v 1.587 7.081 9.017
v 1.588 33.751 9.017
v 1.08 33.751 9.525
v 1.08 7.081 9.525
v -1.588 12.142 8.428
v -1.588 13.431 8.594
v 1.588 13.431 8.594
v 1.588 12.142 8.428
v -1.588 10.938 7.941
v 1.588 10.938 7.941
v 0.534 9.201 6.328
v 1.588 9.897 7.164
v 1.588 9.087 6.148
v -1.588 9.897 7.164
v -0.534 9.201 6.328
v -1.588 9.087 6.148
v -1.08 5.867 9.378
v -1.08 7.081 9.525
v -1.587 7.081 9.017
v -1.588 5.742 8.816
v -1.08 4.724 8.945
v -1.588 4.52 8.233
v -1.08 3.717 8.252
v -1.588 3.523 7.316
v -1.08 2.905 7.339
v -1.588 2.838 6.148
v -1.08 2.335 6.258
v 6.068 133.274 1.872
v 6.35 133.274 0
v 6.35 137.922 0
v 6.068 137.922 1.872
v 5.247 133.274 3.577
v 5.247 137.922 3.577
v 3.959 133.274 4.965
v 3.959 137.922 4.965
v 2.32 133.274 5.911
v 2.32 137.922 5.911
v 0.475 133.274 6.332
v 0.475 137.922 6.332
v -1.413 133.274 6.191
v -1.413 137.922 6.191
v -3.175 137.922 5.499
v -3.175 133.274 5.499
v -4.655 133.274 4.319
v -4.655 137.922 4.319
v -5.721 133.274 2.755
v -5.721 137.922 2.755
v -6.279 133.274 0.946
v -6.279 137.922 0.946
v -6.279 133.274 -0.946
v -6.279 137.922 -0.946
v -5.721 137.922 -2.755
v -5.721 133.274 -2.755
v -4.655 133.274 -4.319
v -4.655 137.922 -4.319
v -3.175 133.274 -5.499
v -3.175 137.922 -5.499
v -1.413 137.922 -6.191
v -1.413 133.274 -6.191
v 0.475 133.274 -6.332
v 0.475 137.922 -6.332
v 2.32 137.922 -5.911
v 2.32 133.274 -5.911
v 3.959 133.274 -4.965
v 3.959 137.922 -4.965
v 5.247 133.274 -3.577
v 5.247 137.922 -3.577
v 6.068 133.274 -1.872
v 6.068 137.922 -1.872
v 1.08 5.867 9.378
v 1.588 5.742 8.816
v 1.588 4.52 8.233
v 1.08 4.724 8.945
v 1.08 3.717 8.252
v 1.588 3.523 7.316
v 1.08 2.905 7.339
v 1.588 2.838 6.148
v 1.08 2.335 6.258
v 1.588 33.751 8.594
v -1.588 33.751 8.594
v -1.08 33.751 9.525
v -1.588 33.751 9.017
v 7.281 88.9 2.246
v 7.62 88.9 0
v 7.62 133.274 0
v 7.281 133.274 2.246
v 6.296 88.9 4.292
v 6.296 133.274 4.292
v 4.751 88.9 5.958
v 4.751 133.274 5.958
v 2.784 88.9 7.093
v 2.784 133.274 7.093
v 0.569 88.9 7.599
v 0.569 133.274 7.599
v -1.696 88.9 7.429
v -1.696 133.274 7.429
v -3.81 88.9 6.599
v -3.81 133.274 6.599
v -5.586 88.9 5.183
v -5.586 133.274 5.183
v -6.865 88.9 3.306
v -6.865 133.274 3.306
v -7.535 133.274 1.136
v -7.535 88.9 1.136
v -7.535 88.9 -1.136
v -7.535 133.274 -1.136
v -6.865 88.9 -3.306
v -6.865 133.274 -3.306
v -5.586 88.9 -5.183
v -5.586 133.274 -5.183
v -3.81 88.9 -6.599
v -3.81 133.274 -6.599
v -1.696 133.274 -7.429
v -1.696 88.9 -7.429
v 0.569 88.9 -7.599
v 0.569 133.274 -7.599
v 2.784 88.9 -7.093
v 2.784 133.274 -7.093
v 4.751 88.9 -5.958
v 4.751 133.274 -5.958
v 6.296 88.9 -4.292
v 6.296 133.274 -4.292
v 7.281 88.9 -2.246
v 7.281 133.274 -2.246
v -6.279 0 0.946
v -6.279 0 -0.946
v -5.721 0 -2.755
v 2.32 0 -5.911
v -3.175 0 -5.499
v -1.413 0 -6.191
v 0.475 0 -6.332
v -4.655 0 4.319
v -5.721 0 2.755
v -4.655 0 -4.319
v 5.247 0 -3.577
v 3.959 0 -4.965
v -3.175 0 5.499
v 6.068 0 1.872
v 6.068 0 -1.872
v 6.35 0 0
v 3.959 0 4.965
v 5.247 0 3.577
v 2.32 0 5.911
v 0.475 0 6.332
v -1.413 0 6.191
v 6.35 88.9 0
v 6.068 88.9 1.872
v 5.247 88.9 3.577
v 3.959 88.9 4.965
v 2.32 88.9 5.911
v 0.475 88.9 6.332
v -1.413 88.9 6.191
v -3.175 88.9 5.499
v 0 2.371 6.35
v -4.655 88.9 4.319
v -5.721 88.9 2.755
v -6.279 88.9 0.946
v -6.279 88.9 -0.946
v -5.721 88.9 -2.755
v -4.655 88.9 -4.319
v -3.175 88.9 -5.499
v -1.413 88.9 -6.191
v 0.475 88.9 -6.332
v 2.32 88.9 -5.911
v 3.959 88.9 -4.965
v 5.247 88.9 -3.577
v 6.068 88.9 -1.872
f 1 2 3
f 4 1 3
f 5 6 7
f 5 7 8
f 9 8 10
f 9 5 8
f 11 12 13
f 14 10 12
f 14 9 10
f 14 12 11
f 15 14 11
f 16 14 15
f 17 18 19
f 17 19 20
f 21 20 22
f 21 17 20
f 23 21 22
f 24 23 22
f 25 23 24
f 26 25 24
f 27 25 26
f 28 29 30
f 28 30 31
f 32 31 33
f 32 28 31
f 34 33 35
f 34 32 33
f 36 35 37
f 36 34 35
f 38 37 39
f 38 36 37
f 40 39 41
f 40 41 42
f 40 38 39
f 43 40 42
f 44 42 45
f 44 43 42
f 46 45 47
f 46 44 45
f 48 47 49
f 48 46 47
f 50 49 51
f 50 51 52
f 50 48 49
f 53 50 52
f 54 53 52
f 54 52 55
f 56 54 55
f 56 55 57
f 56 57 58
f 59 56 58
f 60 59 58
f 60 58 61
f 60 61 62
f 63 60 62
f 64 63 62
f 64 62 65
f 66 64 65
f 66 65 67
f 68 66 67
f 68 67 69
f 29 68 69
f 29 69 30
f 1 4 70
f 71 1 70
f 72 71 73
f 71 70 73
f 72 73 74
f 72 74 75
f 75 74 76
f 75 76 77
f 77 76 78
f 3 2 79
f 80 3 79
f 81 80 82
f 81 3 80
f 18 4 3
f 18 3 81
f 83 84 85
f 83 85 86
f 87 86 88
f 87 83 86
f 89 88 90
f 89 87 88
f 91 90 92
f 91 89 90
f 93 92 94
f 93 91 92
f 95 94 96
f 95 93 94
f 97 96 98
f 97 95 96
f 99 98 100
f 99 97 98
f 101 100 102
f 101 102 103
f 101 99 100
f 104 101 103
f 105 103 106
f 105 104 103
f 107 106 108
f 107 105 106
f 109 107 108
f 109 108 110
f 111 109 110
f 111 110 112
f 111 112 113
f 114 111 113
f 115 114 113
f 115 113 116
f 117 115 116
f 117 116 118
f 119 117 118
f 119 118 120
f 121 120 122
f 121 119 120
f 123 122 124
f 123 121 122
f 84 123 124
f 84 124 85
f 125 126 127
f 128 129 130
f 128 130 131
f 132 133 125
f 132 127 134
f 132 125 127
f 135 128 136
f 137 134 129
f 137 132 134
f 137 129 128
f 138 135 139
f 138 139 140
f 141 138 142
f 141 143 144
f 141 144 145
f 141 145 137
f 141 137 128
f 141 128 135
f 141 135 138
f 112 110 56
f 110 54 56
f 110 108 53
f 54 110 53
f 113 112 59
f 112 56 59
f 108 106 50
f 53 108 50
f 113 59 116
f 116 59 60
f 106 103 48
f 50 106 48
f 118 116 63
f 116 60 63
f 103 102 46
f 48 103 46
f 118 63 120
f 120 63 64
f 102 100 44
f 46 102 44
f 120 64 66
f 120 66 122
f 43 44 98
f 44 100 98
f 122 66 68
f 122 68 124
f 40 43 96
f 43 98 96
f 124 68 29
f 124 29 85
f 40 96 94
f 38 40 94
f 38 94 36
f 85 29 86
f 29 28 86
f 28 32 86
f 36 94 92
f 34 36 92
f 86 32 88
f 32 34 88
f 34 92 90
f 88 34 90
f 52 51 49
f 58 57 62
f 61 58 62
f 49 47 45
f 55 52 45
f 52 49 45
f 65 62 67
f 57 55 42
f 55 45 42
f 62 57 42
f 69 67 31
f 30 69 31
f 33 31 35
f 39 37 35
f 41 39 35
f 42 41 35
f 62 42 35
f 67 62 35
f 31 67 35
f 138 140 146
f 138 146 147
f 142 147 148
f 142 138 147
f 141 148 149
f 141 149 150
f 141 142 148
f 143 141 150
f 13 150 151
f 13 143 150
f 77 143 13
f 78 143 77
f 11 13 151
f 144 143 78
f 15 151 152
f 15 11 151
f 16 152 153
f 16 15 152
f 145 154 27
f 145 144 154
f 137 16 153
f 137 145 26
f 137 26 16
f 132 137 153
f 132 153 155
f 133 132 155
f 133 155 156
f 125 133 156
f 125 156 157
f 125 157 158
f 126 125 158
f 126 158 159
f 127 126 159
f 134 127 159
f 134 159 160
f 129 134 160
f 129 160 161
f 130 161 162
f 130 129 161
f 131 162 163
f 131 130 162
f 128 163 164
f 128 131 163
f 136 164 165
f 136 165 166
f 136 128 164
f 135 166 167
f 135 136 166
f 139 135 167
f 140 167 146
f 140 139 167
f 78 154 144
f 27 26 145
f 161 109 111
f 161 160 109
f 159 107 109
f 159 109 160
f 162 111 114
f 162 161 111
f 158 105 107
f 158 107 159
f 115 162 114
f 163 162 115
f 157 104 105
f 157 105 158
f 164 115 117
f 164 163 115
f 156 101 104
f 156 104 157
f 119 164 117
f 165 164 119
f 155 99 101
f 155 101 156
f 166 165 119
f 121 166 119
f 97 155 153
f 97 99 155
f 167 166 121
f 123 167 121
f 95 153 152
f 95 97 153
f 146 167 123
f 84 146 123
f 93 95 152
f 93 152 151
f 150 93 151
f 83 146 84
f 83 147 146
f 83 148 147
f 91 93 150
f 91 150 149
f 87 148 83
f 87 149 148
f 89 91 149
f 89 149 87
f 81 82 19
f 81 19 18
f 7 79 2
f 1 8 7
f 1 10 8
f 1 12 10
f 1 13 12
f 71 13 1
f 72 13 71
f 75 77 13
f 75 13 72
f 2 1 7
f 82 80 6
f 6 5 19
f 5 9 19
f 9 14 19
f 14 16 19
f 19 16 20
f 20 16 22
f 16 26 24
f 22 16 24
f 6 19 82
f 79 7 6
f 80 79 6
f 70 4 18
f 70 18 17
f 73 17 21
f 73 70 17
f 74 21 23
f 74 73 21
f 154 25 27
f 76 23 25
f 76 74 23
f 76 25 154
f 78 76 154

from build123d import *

# Parameters (mm, degrees)
F2_W        = 3.175
F2_H        = 6.35
F3_DEPTH    = 9.525
F4_W        = 3.175
F4_H        = 0.9305988193
F5_DEPTH    = 25.4
F6_R        = 5.08
F7_T1_DEPTH = 27.9764149579
F7_T4_ANGLE = 90
F7_T6_ANGLE = 90
F9_R        = 6.35
F10_DEPTH   = 137.922
F11_R       = 7.62
F12_DEPTH   = 44.3738


# Not quite as in the source:
# - a fillet or chamfer that OpenCascade refuses, or shapes differently, is made with other operations: its cross-section is extruded or revolved along the edge and cut away or added
# - the program builds the solid bodies; features that only make, move or delete a surface that nothing else refers to are left out


with BuildPart() as f3:
    # F2 (on Top) → F3 (new body)
    with BuildSketch(Plane.XY):
        with Locations((0, 5.175651788)):
            Rectangle(F2_W, F2_H)
    extrude(amount=F3_DEPTH)

    # F4 (on face) → F5 (join)
    with BuildSketch(Plane(origin=(0, 8.350651788, 0), x_dir=(-1, 0, 0), z_dir=(0, 1, 0))):
        with Locations((0, 9.0597005904)):
            Rectangle(F4_W, F4_H)
    extrude(amount=F5_DEPTH)

    # F6
    f6_edges = [f3.edges().sort_by_distance(p)[0] for p in [
        (0, 8.350652, 8.594401),
        (0, 2.000652, 9.525),
    ]]
    fillet(f6_edges, radius=F6_R)

    # F7: chamfer of 0.508 on 2 edges, made by hand

    # F7_s2 → F7_t1 (cut)
    with BuildSketch(Plane.XZ.offset(-35.0570667459)):
        Polygon((1.5875, 9.017), (1.0795, 9.525), (1.5875, 9.525), align=None)
        Polygon((-1.5875, 9.017), (-1.0795, 9.525), (-1.5875, 9.525), align=None)
    extrude(amount=F7_T1_DEPTH, mode=Mode.SUBTRACT)

    # F7_s3 → F7_t4 (revolve, cut)
    with BuildSketch(Plane.XZ.offset(-7.080651788)):
        Polygon((-1.5875, 9.017), (-1.0795, 9.525), (-1.5875, 9.525), align=None)
    revolve(axis=Axis((-1.5875, 7.080651788, 4.445), (1, 0, 0)), revolution_arc=F7_T4_ANGLE, mode=Mode.SUBTRACT)

    # F7_s5 → F7_t6 (revolve, cut)
    with BuildSketch(Plane.XZ.offset(-7.080651788)):
        Polygon((1.5875, 9.017), (1.0795, 9.525), (1.5875, 9.525), align=None)
    revolve(axis=Axis((1.5875, 7.080651788, 4.445), (1, 0, 0)), revolution_arc=F7_T6_ANGLE, mode=Mode.SUBTRACT)

    # F9 (on Front) → F10 (join)
    with BuildSketch(Plane.XZ):
        Circle(F9_R)
    extrude(amount=-F10_DEPTH)

    # F11 (on face) → F12 (join)
    with BuildSketch(Plane.XZ.offset(-88.9)):
        Circle(F11_R)
    extrude(amount=-F12_DEPTH)


solid = f3.part
